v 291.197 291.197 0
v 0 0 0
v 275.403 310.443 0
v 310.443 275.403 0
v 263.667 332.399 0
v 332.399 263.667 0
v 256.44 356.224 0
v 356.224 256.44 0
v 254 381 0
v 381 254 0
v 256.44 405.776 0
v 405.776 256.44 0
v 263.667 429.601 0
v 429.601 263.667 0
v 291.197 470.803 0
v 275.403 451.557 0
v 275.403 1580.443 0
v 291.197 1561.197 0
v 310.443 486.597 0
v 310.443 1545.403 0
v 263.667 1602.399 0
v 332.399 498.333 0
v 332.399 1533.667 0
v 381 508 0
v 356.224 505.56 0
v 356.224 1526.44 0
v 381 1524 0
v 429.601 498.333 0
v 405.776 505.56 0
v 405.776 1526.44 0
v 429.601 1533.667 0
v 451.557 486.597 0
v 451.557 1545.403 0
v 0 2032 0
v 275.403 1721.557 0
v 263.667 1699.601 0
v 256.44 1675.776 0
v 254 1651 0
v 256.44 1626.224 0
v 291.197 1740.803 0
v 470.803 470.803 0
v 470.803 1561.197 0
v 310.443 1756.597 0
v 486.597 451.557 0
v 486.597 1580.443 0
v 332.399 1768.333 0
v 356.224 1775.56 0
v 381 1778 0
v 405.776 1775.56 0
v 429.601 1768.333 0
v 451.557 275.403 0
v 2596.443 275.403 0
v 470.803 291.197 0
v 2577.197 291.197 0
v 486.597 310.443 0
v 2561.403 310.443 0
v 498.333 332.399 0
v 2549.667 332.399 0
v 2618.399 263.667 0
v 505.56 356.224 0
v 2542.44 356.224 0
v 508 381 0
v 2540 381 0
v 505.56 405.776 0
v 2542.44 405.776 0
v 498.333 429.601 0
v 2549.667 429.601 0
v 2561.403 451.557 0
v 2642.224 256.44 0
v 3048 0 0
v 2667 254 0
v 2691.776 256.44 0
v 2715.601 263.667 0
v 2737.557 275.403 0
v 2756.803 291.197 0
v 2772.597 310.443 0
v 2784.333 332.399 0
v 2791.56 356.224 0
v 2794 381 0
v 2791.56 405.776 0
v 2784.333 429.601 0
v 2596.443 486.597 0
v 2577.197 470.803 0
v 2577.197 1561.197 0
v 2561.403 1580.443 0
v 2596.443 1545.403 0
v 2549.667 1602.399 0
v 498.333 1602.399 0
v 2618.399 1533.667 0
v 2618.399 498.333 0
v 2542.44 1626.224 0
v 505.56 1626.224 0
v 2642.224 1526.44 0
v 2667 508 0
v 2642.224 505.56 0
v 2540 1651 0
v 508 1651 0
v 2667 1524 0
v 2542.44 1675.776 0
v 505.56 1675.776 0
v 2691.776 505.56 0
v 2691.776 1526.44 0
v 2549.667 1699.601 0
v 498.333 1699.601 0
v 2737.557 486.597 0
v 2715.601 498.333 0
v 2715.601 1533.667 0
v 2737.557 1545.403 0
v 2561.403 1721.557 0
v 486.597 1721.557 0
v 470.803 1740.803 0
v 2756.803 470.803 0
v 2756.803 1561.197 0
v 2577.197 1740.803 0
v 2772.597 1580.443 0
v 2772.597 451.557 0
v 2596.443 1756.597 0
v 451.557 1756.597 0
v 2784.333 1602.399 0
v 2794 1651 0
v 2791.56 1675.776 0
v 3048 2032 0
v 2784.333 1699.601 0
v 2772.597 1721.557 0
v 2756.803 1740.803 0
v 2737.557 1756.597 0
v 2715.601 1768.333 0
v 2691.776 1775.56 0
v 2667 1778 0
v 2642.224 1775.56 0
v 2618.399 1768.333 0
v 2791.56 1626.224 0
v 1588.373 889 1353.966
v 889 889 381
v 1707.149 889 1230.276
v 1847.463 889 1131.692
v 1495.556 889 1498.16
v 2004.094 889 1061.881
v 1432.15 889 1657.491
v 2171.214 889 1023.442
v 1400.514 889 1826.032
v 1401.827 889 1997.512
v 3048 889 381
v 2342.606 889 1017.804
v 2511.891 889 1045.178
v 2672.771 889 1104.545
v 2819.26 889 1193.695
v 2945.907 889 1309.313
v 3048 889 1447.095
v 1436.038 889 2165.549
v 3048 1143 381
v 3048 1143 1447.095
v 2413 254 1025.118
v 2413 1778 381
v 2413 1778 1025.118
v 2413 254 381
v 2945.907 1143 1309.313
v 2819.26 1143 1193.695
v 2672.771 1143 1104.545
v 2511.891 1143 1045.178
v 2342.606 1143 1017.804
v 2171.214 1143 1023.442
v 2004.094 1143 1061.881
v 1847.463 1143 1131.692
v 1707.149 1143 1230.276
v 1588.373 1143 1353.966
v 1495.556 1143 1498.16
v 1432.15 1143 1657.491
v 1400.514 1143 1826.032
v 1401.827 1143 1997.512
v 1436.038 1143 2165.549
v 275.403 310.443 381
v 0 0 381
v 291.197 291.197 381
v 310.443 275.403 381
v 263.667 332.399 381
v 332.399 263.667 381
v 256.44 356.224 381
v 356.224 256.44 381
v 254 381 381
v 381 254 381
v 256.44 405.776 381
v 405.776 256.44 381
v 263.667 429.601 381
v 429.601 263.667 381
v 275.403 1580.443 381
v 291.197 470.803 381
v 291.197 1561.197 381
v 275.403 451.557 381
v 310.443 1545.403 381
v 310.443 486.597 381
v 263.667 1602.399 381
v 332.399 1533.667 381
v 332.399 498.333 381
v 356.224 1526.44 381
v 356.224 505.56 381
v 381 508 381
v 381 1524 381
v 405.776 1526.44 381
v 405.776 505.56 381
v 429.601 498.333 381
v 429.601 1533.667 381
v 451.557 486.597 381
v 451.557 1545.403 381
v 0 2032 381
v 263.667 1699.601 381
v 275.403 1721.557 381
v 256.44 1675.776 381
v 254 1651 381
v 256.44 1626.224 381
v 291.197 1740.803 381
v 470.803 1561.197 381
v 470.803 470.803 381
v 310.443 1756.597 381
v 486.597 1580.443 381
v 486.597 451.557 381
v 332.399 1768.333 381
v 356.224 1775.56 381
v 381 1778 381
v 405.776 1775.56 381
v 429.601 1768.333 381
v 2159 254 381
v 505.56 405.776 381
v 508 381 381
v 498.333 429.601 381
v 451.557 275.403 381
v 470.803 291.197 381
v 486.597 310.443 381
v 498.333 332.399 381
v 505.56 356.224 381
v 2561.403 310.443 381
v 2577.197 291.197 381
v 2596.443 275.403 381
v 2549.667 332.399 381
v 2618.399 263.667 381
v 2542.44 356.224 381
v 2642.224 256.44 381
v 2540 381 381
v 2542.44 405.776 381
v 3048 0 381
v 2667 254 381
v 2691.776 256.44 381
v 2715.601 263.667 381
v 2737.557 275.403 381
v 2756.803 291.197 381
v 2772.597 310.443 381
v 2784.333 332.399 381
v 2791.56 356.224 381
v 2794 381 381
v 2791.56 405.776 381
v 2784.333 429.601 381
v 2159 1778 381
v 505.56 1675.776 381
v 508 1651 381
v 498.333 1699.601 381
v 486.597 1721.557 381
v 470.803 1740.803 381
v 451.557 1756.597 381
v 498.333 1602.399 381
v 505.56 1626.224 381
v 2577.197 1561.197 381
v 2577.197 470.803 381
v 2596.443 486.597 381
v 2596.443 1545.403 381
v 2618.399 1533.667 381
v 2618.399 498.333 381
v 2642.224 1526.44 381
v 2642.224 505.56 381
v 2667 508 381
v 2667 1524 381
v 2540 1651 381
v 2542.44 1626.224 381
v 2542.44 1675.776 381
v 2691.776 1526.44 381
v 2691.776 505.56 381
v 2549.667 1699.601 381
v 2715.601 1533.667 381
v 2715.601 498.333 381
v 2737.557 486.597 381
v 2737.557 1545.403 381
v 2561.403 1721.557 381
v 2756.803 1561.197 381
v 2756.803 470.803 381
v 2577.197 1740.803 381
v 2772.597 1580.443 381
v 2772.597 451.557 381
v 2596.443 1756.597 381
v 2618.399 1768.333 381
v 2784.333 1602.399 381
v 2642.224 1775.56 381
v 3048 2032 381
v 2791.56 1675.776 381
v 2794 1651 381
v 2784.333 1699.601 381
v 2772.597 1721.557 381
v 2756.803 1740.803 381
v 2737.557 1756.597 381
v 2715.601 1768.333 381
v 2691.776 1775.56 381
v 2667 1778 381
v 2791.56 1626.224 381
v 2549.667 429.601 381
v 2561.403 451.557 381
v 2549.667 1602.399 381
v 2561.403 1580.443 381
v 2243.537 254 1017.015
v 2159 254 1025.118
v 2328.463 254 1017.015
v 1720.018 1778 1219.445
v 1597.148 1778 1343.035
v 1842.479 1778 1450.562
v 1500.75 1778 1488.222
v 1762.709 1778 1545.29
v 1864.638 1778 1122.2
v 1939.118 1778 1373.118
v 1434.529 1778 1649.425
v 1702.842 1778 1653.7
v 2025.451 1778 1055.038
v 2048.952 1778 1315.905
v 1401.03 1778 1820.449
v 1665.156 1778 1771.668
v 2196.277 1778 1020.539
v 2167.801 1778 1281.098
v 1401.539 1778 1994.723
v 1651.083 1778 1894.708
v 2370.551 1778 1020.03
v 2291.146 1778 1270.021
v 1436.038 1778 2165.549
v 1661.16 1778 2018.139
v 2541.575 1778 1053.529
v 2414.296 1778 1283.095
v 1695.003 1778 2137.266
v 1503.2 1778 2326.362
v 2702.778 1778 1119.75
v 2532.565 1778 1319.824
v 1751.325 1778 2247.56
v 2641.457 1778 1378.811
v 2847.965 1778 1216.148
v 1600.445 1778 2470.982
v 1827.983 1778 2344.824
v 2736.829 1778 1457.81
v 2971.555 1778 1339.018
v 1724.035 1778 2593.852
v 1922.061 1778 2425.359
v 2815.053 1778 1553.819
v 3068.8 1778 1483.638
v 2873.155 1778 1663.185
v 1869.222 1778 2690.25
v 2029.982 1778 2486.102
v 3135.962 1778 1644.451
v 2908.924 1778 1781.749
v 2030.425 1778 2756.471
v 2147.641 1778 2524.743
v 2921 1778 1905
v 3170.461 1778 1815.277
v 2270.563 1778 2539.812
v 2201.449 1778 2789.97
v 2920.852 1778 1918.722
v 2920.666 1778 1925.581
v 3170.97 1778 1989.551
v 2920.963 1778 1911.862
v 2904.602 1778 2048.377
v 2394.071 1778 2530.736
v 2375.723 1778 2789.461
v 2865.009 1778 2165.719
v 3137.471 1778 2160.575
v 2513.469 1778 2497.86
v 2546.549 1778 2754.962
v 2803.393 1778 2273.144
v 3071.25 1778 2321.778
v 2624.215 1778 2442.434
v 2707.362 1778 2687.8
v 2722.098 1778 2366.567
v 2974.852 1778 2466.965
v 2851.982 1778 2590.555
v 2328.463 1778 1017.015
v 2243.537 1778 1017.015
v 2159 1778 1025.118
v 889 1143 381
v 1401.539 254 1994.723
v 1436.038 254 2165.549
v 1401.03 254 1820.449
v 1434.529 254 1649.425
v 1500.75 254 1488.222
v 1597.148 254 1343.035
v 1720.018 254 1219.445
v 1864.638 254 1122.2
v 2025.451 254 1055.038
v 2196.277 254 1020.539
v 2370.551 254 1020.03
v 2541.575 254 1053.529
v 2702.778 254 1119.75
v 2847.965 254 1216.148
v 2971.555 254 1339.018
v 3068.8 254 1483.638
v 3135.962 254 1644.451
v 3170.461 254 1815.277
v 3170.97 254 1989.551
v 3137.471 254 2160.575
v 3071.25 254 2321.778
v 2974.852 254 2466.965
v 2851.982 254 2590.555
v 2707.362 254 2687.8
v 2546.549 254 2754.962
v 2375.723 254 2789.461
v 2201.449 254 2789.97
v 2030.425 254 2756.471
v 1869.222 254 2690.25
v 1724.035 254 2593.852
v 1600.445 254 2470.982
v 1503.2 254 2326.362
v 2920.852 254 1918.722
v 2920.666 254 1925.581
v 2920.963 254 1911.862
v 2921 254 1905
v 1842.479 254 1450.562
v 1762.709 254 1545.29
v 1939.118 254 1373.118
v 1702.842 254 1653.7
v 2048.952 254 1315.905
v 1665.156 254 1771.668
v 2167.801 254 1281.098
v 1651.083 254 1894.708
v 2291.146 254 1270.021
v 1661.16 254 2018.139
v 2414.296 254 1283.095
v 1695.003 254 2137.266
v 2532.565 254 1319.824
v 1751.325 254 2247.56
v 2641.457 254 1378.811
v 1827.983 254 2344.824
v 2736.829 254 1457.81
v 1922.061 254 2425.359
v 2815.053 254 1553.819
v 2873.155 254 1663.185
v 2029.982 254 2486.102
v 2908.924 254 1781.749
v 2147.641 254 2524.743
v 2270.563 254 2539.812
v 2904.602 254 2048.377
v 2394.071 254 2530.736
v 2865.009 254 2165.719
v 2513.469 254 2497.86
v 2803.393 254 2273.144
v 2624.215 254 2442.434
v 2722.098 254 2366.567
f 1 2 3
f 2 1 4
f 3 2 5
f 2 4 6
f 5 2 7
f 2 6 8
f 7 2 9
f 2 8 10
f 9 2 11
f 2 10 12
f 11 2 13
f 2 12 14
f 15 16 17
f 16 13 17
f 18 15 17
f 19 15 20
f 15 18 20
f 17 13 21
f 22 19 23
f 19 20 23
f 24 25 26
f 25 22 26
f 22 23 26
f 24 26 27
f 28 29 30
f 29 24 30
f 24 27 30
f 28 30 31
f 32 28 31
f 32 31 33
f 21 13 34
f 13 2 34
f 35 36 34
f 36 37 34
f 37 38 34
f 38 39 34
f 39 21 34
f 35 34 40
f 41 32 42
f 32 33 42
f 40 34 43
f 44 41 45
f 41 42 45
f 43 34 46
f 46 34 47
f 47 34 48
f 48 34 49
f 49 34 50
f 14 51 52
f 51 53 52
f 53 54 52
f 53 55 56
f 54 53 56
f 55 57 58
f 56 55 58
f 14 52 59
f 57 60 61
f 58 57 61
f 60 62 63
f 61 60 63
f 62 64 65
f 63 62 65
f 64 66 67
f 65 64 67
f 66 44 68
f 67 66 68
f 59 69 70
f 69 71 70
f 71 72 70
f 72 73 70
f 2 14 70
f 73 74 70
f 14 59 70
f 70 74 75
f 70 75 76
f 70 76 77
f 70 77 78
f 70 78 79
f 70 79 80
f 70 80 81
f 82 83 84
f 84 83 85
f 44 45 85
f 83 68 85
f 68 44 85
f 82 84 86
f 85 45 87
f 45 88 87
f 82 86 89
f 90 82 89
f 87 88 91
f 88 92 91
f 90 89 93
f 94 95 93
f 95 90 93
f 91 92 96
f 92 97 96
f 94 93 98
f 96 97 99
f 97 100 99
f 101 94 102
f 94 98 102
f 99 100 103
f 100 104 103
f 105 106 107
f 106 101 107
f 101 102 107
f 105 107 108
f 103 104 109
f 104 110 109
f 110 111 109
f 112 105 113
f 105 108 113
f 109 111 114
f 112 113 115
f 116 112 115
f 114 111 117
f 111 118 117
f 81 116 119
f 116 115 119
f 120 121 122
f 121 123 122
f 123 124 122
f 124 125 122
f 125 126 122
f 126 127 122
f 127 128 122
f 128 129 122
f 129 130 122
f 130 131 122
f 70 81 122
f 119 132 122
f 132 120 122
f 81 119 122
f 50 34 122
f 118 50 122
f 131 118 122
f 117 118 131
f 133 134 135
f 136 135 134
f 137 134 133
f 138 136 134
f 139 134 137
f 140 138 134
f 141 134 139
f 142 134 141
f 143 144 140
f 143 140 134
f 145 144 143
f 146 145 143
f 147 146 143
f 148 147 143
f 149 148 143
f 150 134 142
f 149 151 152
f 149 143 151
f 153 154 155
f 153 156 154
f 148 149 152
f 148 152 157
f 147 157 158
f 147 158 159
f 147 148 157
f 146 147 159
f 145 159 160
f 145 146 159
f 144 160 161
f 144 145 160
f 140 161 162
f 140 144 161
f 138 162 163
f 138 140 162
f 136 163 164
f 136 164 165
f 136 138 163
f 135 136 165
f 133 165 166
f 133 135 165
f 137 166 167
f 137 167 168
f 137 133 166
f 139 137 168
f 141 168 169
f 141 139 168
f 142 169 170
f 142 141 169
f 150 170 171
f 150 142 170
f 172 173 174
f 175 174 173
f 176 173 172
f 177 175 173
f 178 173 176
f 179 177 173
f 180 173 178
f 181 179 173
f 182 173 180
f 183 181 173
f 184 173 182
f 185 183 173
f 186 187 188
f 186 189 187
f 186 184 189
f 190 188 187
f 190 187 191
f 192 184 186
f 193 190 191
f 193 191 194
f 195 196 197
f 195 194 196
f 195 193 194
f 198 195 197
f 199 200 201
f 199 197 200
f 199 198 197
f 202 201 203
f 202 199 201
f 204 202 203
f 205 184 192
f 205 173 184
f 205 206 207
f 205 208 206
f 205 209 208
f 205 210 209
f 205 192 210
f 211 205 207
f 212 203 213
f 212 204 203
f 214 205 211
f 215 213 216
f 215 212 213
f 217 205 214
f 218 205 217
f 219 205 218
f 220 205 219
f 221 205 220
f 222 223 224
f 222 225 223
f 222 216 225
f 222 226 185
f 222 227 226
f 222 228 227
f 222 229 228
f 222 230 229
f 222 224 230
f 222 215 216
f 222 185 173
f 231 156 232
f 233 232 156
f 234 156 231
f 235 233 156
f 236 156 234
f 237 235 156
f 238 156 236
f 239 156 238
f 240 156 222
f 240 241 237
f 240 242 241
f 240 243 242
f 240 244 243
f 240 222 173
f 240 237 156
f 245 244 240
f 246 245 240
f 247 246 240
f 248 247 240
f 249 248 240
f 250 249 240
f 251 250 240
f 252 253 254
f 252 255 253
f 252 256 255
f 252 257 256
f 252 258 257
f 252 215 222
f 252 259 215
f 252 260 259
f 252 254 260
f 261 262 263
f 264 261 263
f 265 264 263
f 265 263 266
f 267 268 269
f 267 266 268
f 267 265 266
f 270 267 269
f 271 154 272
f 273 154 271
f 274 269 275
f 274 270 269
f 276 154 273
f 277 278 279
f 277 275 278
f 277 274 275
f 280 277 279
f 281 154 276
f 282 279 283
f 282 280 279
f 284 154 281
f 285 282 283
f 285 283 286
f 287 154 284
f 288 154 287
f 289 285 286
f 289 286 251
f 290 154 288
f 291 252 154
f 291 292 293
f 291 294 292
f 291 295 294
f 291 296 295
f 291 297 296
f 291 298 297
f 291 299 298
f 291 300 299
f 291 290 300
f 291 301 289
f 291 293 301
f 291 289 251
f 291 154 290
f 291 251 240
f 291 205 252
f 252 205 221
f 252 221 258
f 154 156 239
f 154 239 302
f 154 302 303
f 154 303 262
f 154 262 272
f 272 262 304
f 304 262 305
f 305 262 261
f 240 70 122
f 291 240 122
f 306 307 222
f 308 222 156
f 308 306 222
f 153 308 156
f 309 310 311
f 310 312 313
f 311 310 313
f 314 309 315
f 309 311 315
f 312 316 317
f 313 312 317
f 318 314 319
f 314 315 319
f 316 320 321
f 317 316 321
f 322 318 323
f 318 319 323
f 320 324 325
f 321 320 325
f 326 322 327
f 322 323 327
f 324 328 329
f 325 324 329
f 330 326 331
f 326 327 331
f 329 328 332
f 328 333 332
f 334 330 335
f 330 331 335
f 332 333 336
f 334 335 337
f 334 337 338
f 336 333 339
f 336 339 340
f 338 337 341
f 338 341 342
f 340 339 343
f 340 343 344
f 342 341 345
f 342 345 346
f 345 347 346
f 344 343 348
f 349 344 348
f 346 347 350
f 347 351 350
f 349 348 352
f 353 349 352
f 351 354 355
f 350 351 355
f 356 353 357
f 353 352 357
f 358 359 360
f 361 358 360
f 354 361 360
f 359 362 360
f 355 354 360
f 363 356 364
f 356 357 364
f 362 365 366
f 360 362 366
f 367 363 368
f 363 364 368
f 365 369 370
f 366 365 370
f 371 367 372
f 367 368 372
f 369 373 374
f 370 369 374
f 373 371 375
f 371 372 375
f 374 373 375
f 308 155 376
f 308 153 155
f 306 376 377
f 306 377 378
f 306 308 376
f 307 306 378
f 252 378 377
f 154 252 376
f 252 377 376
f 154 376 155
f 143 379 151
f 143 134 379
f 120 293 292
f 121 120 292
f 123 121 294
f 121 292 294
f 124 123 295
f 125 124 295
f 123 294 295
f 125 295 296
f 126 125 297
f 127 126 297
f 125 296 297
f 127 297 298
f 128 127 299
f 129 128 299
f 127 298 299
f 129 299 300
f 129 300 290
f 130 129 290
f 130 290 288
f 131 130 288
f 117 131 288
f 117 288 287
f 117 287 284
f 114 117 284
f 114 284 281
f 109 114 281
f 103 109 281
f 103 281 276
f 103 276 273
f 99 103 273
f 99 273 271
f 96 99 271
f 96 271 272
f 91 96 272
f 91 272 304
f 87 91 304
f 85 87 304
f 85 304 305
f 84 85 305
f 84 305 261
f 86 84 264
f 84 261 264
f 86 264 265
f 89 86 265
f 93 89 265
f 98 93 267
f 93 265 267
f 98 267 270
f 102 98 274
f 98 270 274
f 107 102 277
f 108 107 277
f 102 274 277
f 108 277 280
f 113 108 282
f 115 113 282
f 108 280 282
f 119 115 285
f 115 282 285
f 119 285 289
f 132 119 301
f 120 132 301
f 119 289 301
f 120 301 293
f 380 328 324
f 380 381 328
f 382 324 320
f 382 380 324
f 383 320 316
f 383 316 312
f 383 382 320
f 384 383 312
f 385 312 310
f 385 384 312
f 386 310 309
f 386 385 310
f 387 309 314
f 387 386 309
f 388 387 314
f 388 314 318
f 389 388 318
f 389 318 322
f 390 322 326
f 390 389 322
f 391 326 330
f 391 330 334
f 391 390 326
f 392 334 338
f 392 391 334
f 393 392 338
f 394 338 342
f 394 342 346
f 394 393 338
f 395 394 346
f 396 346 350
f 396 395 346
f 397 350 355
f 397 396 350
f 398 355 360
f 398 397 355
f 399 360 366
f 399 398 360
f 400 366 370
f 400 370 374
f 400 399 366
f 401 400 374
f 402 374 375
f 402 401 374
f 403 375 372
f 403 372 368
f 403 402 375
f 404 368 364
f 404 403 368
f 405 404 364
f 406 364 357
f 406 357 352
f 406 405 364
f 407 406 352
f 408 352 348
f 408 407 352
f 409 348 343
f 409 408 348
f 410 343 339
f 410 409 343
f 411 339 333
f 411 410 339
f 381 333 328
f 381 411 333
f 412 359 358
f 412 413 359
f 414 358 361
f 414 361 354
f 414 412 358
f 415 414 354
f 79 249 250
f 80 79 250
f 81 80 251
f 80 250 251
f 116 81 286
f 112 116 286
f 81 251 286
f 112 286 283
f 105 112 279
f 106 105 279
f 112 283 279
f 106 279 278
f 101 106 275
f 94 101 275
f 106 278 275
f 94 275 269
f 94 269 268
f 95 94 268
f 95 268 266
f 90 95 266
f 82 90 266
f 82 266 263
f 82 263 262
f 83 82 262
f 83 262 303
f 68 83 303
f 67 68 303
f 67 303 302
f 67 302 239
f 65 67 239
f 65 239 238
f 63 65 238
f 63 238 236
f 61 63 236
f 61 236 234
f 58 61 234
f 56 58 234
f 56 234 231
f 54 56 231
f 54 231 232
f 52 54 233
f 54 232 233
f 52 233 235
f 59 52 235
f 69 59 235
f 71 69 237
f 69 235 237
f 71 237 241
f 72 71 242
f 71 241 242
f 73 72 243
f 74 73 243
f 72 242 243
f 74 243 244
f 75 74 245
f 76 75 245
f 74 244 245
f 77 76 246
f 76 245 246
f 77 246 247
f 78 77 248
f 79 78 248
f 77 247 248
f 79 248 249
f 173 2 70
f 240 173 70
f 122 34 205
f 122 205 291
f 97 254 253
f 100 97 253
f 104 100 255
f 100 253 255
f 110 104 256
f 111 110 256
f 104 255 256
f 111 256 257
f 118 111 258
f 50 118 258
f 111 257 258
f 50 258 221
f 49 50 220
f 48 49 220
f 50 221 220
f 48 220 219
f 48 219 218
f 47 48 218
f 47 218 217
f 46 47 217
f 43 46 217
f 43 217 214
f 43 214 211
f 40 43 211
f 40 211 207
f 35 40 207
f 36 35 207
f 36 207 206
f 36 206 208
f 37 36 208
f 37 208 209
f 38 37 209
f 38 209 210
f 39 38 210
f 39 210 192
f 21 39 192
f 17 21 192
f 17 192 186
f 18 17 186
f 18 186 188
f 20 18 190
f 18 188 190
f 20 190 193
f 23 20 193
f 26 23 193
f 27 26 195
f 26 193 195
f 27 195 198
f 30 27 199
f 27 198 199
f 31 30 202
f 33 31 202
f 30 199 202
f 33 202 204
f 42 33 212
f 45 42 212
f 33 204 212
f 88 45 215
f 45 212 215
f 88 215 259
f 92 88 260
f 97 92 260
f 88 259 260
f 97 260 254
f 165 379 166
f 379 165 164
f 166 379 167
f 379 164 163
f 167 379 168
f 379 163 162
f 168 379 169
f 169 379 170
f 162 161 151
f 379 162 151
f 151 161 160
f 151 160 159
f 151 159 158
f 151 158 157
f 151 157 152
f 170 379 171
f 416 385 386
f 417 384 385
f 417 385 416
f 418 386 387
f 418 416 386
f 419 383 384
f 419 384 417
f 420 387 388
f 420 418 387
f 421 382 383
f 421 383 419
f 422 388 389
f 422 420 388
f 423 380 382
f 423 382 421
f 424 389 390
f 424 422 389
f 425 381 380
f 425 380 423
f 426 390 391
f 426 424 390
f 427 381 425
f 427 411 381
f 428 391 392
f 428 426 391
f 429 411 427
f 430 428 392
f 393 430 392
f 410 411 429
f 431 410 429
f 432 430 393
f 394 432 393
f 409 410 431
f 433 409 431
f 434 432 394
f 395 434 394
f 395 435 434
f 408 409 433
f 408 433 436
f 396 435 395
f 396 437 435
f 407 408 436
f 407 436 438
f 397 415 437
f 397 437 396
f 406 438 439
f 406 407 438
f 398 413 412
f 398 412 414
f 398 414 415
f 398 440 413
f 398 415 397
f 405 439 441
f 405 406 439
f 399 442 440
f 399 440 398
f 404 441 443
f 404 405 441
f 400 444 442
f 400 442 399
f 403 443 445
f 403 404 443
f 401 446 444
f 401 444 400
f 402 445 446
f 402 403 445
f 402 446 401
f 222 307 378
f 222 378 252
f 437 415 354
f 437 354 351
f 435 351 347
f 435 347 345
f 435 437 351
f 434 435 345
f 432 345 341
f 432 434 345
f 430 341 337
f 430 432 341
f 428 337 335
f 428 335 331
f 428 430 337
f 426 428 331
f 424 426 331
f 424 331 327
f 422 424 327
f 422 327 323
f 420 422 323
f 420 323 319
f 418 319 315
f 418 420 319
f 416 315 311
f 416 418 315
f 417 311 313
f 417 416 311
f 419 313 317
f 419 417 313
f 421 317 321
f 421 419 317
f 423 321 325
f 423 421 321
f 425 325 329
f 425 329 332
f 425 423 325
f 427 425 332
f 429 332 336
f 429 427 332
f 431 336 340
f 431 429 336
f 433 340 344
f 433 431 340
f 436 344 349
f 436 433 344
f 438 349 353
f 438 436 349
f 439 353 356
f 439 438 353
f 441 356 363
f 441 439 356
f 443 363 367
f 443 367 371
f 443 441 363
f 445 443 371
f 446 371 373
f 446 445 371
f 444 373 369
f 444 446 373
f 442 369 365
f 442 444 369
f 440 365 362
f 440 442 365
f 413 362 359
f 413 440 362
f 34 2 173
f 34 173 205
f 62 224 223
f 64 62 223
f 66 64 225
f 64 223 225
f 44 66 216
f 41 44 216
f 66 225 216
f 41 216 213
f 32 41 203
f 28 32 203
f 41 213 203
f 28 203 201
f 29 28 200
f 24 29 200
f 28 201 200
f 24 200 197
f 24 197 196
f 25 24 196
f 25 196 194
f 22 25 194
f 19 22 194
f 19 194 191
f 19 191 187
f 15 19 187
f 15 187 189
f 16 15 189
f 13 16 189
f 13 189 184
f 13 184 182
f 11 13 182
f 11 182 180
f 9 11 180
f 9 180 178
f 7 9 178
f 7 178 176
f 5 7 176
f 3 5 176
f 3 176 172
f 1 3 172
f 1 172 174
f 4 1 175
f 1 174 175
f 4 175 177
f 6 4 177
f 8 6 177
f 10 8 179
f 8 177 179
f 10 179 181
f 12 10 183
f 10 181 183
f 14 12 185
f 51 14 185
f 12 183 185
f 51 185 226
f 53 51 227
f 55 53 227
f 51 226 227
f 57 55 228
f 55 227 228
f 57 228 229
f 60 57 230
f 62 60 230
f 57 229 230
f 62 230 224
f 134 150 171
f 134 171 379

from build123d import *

# Parameters (mm, degrees)
F0_W          = 3048
F0_H          = 2032
F1_DEPTH      = 381
F2_R          = 127
F3_DEPTH      = 381.001
F6_DEPTH      = 762
F6_DEPTH_BACK = 762
F7_DEPTH      = 127
F7_DEPTH_BACK = 127
F8_DEPTH      = 762
F8_DEPTH_BACK = 762


# Not quite as in the source:
# - a feature names something its author has since deleted; it is built from what else it names


with BuildPart() as f1:
    # F0 (on Top) → F1 (new body)
    with BuildSketch(Plane.XY):
        with Locations((1524, 1016)):
            Rectangle(F0_W, F0_H)
    extrude(amount=F1_DEPTH)

    # F2 (on face) → F3 (cut, through all)
    with BuildSketch(Plane.XY.offset(381)):
        with Locations((381, 381)):
            Circle(F2_R)
        with Locations((2667, 1651)):
            Circle(F2_R)
        with Locations((2667, 381)):
            Circle(F2_R)
        with Locations((381, 1651)):
            Circle(F2_R)
    extrude(amount=-F3_DEPTH, mode=Mode.SUBTRACT)

    # F5 (on offset) → F8 (join, two sides)
    with BuildSketch(Plane.XZ.offset(-1016)) as f8_sk:
        with BuildLine():
            ThreePointArc((2413, 1025.118189755), (2286, 1016), (2159, 1025.118189755))
            Line((2159, 1025.118189755), (2159, 381))
            Line((2159, 381), (2413, 381))
            Line((2413, 381), (2413, 1025.118189755))
        make_face()
    extrude(amount=F8_DEPTH)
    extrude(f8_sk.sketch, amount=-F8_DEPTH_BACK)


with BuildPart() as f6:
    # F5 (on offset) → F6 (new body, two sides)
    with BuildSketch(Plane.XZ.offset(-1016)) as f6_sk:
        with BuildLine():
            ThreePointArc((3048, 1447.094988016), (3142.6618352652, 1667.4047559398), (3175, 1905))
            ThreePointArc((3175, 1905), (2417.7284143182, 2784.1863425129), (1436.0379643167, 2165.5485327097))
            Line((1436.0379643167, 2165.5485327097), (1690.1354455927, 2124.4776362207))
            ThreePointArc((1690.1354455927, 2124.4776362207), (2387.3228201241, 2531.8641687974), (2920.6663706387, 1925.5814960652))
            Line((2920.6663706387, 1925.5814960652), (3048, 1905))
            Line((3048, 1905), (3048, 1447.094988016))
        make_face()
        with BuildLine():
            Line((1690.1354455927, 2124.4776362207), (1436.0379643167, 2165.5485327097))
            ThreePointArc((1436.0379643167, 2165.5485327097), (1535.1611047805, 1429.0147550338), (2159, 1025.118189755))
            ThreePointArc((2159, 1025.118189755), (2286, 1016), (2413, 1025.118189755))
            ThreePointArc((2413, 1025.118189755), (2778.0328795595, 1164.5780625668), (3048, 1447.094988016))
            Line((3048, 1447.094988016), (3048, 1905))
            Line((3048, 1905), (2920.6663706387, 1925.5814960652))
            ThreePointArc((2920.6663706387, 1925.5814960652), (2920.9165871812, 1915.2920999902), (2921, 1905))
            ThreePointArc((2921, 1905), (2174.5302553349, 1279.8604187669), (1690.1354455927, 2124.4776362207))
        make_face()
    extrude(amount=F6_DEPTH)
    extrude(f6_sk.sketch, amount=-F6_DEPTH_BACK)


with BuildPart() as f7:
    # F5 (on offset) → F7 (new body, two sides)
    with BuildSketch(Plane.XZ.offset(-1016)) as f7_sk:
        with BuildLine():
            ThreePointArc((2413, 1025.118189755), (2286, 1016), (2159, 1025.118189755))
            Line((2159, 1025.118189755), (2159, 381))
            Line((2159, 381), (2413, 381))
            Line((2413, 381), (2413, 1025.118189755))
        make_face()
        with BuildLine():
            Line((3048, 381), (3048, 1447.094988016))
            ThreePointArc((3048, 1447.094988016), (2778.0328795595, 1164.5780625668), (2413, 1025.118189755))
            Line((2413, 1025.118189755), (2413, 381))
            Line((2413, 381), (3048, 381))
        make_face()
        with BuildLine():
            ThreePointArc((2159, 1025.118189755), (1535.1611047805, 1429.0147550338), (1436.0379643167, 2165.5485327097))
            Line((1436.0379643167, 2165.5485327097), (889, 381))
            Line((889, 381), (2159, 381))
            Line((2159, 381), (2159, 1025.118189755))
        make_face()
    extrude(amount=F7_DEPTH)
    extrude(f7_sk.sketch, amount=-F7_DEPTH_BACK)


solid = Compound([f1.part, f6.part, f7.part])
